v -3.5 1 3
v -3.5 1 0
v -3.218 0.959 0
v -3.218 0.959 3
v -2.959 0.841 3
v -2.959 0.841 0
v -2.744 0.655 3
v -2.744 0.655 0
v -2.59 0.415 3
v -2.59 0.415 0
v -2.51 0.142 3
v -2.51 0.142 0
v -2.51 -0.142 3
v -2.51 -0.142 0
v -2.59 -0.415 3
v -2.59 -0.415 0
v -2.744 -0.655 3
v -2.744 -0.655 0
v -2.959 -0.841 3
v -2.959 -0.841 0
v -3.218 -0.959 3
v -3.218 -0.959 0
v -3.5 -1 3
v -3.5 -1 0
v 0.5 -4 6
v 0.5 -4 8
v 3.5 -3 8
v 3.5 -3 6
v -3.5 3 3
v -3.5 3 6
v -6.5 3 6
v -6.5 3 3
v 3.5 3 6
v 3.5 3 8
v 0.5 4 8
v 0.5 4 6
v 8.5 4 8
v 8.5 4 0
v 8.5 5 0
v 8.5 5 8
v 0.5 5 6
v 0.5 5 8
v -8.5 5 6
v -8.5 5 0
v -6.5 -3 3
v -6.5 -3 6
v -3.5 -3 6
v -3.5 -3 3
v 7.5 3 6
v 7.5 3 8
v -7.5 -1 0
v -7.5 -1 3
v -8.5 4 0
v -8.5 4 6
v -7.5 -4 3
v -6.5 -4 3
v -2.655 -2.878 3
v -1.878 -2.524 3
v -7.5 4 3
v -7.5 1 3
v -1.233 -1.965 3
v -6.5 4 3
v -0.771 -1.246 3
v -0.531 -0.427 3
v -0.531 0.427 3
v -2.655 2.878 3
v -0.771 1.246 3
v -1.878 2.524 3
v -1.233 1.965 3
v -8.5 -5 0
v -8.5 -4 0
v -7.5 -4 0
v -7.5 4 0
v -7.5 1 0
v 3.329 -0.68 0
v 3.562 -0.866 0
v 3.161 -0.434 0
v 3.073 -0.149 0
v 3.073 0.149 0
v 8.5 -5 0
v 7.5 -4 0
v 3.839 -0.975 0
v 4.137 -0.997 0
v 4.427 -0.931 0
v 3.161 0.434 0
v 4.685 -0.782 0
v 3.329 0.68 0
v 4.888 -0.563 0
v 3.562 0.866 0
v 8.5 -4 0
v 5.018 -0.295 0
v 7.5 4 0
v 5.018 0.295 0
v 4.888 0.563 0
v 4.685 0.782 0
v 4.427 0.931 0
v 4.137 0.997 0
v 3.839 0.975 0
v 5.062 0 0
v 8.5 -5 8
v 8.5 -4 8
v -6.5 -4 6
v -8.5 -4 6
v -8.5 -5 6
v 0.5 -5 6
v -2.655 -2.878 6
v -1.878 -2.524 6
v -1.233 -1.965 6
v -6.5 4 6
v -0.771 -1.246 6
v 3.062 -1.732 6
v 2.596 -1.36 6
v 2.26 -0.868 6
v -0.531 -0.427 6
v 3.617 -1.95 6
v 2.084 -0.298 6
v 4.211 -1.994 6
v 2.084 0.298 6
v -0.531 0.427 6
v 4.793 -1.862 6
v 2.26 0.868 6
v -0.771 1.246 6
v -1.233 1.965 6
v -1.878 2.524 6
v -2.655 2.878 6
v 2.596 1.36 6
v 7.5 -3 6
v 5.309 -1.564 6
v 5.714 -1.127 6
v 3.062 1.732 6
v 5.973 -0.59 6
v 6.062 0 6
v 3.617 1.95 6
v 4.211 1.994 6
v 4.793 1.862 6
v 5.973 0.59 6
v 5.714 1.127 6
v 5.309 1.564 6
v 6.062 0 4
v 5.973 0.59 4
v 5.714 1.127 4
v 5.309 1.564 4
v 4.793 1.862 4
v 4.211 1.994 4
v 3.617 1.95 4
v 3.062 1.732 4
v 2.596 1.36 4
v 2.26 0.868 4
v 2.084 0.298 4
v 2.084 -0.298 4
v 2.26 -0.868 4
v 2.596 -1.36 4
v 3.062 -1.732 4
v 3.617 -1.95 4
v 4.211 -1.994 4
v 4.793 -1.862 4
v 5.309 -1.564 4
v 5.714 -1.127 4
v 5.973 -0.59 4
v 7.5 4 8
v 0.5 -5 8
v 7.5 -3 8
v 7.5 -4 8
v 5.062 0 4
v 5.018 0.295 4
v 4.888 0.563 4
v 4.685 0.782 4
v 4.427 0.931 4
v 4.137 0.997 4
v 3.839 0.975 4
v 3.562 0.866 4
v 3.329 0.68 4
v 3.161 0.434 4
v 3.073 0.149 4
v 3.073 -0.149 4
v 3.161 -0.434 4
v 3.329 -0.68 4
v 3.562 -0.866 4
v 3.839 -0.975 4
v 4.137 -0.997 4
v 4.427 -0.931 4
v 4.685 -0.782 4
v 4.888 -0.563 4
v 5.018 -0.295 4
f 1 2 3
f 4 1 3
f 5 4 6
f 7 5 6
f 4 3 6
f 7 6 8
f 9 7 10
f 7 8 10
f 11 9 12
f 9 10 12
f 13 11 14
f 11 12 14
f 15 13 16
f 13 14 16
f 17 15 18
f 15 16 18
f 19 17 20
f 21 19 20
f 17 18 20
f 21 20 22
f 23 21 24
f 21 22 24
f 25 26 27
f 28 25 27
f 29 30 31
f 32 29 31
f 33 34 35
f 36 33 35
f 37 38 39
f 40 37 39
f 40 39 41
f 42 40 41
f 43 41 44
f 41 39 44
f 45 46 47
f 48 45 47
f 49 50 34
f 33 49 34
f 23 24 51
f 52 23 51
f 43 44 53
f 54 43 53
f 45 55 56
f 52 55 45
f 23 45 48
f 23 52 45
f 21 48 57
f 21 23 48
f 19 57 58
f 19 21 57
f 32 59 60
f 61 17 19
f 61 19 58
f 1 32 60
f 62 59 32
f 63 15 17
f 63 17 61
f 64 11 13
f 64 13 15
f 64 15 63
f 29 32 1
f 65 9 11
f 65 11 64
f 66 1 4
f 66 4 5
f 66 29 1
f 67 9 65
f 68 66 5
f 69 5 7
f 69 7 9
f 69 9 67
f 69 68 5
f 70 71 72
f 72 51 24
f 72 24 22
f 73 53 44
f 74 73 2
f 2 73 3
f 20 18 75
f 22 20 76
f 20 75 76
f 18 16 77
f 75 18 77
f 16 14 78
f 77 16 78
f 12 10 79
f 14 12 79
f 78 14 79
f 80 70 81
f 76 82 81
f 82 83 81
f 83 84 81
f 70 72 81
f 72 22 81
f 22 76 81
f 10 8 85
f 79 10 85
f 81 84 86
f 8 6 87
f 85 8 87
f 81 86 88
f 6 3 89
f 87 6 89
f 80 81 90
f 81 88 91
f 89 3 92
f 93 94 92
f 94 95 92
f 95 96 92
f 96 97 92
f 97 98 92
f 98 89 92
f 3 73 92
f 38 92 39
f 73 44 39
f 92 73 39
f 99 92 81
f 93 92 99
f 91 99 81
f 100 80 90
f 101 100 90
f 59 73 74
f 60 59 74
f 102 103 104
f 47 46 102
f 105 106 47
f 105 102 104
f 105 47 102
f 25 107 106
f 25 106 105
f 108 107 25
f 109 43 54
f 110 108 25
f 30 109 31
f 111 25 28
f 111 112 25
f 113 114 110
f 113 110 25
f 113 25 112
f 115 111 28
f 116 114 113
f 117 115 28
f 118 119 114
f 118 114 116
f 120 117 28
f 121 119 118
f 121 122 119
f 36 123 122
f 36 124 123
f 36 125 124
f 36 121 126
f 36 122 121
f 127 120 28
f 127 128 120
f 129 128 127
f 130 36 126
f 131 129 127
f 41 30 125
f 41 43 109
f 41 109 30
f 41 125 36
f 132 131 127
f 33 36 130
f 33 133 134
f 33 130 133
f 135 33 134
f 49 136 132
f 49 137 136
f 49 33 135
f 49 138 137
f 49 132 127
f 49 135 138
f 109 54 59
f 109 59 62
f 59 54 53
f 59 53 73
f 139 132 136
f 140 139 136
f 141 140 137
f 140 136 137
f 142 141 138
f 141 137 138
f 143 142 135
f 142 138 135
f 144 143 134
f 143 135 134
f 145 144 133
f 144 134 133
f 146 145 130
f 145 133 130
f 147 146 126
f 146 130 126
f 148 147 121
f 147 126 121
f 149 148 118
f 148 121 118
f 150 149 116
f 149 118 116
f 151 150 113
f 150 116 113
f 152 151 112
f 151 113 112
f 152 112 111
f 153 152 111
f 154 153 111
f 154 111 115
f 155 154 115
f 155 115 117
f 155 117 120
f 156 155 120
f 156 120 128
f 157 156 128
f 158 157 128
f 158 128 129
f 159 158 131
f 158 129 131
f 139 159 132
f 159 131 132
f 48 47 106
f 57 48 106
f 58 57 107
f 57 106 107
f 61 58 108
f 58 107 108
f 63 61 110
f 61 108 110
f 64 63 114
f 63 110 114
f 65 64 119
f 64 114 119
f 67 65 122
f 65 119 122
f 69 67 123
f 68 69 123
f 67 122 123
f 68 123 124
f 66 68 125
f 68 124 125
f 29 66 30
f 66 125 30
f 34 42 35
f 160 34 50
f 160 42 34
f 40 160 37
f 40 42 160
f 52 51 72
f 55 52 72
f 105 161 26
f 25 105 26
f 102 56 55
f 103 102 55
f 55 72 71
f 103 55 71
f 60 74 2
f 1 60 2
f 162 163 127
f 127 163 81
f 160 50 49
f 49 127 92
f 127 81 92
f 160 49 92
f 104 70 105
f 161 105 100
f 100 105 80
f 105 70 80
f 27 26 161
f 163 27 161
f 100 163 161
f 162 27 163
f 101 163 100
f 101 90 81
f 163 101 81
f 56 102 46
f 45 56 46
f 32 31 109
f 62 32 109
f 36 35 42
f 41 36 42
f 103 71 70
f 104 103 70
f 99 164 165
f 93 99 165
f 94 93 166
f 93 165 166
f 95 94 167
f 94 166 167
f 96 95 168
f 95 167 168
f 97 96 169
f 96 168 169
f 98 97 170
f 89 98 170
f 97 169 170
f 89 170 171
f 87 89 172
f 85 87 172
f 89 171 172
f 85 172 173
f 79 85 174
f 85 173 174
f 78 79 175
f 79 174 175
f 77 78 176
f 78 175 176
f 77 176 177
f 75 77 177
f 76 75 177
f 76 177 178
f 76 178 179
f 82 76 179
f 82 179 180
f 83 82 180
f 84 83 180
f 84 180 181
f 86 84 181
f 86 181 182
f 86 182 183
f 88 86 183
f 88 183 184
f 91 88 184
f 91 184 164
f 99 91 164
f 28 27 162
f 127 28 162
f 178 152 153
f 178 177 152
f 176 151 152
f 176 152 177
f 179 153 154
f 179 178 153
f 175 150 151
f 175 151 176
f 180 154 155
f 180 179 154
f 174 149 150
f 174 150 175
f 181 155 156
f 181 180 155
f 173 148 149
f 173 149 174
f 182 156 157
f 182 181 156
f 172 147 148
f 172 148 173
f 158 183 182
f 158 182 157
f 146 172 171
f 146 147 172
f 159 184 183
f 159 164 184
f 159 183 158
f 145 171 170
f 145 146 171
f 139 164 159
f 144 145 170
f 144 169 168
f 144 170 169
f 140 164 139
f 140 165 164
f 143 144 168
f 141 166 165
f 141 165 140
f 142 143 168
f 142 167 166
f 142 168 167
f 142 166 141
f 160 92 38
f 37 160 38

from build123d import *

# Parameters (mm, degrees)
BOSS_EXTRUDE1_DEPTH = 8
CUT_EXTRUDE1_DEPTH  = 2
SKETCH4_R           = 2
CUT_EXTRUDE2_DEPTH  = 2
SKETCH5_R           = 1
CUT_EXTRUDE3_DEPTH  = 22
CUT_EXTRUDE4_DEPTH  = 3


with BuildPart() as part:
    # Sketch1 → Boss-Extrude1 (new body)
    with BuildSketch(Plane.XY):
        with BuildLine():
            Line((8.5, 4), (8.5, 5))
            Line((8.5, 5), (-8.5, 5))
            Line((-8.5, 5), (-8.5, 4))
            Line((-8.5, 4), (-7.5, 4))
            Line((-7.5, 4), (-7.5, 1))
            Line((-7.5, 1), (-3.5, 1))
            ThreePointArc((-3.5, 1), (-2.5, 0), (-3.5, -1))
            Line((-3.5, -1), (-7.5, -1))
            Line((-7.5, -1), (-7.5, -4))
            Line((-7.5, -4), (-8.5, -4))
            Line((-8.5, -4), (-8.5, -5))
            Line((-8.5, -5), (8.5, -5))
            Line((8.5, -5), (8.5, -4))
            Line((8.5, -4), (7.5, -4))
            Line((7.5, -4), (7.5, 4))
            Line((7.5, 4), (8.5, 4))
        make_face()
    extrude(amount=BOSS_EXTRUDE1_DEPTH)

    # Sketch3 → Cut-Extrude1 (cut)
    with BuildSketch(Plane.XY.offset(8)):
        with BuildLine():
            Line((0.5, 4), (0.5, 5))
            Line((0.5, 5), (-8.5, 5))
            Line((-8.5, 5), (-8.5, 4))
            Line((-8.5, 4), (-7.5, 4))
            Line((-7.5, 4), (-7.5, 1))
            Line((-7.5, 1), (-3.5, 1))
            ThreePointArc((-3.5, 1), (-2.5, 0), (-3.5, -1))
            Line((-3.5, -1), (-7.5, -1))
            Line((-7.5, -1), (-7.5, -4))
            Line((-7.5, -4), (-8.5, -4))
            Line((-8.5, -4), (-8.5, -5))
            Line((-8.5, -5), (0.5, -5))
            Line((0.5, -5), (0.5, -4))
            Line((0.5, -4), (3.5, -3))
            Line((3.5, -3), (7.5, -3))
            Line((7.5, -3), (7.5, 3))
            Line((7.5, 3), (3.5, 3))
            Line((3.5, 3), (0.5, 4))
        make_face()
    extrude(amount=-CUT_EXTRUDE1_DEPTH, mode=Mode.SUBTRACT)

    # Sketch4 → Cut-Extrude2 (cut)
    with BuildSketch(Plane.XY.offset(6)):
        with Locations((4.062000401, 0)):
            Circle(SKETCH4_R)
    extrude(amount=-CUT_EXTRUDE2_DEPTH, mode=Mode.SUBTRACT)

    # Sketch5 → Cut-Extrude3 (cut)
    with BuildSketch(Plane.XY.offset(4)):
        with Locations((4.062000401, 0)):
            Circle(SKETCH5_R)
    extrude(amount=-CUT_EXTRUDE3_DEPTH, mode=Mode.SUBTRACT)

    # Sketch6 → Cut-Extrude4 (cut)
    with BuildSketch(Plane.XY.offset(6)):
        with BuildLine():
            Line((-6.5, 3), (-6.5, 4))
            Line((-6.5, 4), (-7.5, 4))
            Line((-7.5, 4), (-7.5, -4))
            Line((-7.5, -4), (-6.5, -4))
            Line((-6.5, -4), (-6.5, -3))
            Line((-6.5, -3), (-3.5, -3))
            ThreePointArc((-3.5, -3), (-0.5, 0), (-3.5, 3))
            Line((-3.5, 3), (-6.5, 3))
        make_face()
    extrude(amount=-CUT_EXTRUDE4_DEPTH, mode=Mode.SUBTRACT)


solid = part.part
